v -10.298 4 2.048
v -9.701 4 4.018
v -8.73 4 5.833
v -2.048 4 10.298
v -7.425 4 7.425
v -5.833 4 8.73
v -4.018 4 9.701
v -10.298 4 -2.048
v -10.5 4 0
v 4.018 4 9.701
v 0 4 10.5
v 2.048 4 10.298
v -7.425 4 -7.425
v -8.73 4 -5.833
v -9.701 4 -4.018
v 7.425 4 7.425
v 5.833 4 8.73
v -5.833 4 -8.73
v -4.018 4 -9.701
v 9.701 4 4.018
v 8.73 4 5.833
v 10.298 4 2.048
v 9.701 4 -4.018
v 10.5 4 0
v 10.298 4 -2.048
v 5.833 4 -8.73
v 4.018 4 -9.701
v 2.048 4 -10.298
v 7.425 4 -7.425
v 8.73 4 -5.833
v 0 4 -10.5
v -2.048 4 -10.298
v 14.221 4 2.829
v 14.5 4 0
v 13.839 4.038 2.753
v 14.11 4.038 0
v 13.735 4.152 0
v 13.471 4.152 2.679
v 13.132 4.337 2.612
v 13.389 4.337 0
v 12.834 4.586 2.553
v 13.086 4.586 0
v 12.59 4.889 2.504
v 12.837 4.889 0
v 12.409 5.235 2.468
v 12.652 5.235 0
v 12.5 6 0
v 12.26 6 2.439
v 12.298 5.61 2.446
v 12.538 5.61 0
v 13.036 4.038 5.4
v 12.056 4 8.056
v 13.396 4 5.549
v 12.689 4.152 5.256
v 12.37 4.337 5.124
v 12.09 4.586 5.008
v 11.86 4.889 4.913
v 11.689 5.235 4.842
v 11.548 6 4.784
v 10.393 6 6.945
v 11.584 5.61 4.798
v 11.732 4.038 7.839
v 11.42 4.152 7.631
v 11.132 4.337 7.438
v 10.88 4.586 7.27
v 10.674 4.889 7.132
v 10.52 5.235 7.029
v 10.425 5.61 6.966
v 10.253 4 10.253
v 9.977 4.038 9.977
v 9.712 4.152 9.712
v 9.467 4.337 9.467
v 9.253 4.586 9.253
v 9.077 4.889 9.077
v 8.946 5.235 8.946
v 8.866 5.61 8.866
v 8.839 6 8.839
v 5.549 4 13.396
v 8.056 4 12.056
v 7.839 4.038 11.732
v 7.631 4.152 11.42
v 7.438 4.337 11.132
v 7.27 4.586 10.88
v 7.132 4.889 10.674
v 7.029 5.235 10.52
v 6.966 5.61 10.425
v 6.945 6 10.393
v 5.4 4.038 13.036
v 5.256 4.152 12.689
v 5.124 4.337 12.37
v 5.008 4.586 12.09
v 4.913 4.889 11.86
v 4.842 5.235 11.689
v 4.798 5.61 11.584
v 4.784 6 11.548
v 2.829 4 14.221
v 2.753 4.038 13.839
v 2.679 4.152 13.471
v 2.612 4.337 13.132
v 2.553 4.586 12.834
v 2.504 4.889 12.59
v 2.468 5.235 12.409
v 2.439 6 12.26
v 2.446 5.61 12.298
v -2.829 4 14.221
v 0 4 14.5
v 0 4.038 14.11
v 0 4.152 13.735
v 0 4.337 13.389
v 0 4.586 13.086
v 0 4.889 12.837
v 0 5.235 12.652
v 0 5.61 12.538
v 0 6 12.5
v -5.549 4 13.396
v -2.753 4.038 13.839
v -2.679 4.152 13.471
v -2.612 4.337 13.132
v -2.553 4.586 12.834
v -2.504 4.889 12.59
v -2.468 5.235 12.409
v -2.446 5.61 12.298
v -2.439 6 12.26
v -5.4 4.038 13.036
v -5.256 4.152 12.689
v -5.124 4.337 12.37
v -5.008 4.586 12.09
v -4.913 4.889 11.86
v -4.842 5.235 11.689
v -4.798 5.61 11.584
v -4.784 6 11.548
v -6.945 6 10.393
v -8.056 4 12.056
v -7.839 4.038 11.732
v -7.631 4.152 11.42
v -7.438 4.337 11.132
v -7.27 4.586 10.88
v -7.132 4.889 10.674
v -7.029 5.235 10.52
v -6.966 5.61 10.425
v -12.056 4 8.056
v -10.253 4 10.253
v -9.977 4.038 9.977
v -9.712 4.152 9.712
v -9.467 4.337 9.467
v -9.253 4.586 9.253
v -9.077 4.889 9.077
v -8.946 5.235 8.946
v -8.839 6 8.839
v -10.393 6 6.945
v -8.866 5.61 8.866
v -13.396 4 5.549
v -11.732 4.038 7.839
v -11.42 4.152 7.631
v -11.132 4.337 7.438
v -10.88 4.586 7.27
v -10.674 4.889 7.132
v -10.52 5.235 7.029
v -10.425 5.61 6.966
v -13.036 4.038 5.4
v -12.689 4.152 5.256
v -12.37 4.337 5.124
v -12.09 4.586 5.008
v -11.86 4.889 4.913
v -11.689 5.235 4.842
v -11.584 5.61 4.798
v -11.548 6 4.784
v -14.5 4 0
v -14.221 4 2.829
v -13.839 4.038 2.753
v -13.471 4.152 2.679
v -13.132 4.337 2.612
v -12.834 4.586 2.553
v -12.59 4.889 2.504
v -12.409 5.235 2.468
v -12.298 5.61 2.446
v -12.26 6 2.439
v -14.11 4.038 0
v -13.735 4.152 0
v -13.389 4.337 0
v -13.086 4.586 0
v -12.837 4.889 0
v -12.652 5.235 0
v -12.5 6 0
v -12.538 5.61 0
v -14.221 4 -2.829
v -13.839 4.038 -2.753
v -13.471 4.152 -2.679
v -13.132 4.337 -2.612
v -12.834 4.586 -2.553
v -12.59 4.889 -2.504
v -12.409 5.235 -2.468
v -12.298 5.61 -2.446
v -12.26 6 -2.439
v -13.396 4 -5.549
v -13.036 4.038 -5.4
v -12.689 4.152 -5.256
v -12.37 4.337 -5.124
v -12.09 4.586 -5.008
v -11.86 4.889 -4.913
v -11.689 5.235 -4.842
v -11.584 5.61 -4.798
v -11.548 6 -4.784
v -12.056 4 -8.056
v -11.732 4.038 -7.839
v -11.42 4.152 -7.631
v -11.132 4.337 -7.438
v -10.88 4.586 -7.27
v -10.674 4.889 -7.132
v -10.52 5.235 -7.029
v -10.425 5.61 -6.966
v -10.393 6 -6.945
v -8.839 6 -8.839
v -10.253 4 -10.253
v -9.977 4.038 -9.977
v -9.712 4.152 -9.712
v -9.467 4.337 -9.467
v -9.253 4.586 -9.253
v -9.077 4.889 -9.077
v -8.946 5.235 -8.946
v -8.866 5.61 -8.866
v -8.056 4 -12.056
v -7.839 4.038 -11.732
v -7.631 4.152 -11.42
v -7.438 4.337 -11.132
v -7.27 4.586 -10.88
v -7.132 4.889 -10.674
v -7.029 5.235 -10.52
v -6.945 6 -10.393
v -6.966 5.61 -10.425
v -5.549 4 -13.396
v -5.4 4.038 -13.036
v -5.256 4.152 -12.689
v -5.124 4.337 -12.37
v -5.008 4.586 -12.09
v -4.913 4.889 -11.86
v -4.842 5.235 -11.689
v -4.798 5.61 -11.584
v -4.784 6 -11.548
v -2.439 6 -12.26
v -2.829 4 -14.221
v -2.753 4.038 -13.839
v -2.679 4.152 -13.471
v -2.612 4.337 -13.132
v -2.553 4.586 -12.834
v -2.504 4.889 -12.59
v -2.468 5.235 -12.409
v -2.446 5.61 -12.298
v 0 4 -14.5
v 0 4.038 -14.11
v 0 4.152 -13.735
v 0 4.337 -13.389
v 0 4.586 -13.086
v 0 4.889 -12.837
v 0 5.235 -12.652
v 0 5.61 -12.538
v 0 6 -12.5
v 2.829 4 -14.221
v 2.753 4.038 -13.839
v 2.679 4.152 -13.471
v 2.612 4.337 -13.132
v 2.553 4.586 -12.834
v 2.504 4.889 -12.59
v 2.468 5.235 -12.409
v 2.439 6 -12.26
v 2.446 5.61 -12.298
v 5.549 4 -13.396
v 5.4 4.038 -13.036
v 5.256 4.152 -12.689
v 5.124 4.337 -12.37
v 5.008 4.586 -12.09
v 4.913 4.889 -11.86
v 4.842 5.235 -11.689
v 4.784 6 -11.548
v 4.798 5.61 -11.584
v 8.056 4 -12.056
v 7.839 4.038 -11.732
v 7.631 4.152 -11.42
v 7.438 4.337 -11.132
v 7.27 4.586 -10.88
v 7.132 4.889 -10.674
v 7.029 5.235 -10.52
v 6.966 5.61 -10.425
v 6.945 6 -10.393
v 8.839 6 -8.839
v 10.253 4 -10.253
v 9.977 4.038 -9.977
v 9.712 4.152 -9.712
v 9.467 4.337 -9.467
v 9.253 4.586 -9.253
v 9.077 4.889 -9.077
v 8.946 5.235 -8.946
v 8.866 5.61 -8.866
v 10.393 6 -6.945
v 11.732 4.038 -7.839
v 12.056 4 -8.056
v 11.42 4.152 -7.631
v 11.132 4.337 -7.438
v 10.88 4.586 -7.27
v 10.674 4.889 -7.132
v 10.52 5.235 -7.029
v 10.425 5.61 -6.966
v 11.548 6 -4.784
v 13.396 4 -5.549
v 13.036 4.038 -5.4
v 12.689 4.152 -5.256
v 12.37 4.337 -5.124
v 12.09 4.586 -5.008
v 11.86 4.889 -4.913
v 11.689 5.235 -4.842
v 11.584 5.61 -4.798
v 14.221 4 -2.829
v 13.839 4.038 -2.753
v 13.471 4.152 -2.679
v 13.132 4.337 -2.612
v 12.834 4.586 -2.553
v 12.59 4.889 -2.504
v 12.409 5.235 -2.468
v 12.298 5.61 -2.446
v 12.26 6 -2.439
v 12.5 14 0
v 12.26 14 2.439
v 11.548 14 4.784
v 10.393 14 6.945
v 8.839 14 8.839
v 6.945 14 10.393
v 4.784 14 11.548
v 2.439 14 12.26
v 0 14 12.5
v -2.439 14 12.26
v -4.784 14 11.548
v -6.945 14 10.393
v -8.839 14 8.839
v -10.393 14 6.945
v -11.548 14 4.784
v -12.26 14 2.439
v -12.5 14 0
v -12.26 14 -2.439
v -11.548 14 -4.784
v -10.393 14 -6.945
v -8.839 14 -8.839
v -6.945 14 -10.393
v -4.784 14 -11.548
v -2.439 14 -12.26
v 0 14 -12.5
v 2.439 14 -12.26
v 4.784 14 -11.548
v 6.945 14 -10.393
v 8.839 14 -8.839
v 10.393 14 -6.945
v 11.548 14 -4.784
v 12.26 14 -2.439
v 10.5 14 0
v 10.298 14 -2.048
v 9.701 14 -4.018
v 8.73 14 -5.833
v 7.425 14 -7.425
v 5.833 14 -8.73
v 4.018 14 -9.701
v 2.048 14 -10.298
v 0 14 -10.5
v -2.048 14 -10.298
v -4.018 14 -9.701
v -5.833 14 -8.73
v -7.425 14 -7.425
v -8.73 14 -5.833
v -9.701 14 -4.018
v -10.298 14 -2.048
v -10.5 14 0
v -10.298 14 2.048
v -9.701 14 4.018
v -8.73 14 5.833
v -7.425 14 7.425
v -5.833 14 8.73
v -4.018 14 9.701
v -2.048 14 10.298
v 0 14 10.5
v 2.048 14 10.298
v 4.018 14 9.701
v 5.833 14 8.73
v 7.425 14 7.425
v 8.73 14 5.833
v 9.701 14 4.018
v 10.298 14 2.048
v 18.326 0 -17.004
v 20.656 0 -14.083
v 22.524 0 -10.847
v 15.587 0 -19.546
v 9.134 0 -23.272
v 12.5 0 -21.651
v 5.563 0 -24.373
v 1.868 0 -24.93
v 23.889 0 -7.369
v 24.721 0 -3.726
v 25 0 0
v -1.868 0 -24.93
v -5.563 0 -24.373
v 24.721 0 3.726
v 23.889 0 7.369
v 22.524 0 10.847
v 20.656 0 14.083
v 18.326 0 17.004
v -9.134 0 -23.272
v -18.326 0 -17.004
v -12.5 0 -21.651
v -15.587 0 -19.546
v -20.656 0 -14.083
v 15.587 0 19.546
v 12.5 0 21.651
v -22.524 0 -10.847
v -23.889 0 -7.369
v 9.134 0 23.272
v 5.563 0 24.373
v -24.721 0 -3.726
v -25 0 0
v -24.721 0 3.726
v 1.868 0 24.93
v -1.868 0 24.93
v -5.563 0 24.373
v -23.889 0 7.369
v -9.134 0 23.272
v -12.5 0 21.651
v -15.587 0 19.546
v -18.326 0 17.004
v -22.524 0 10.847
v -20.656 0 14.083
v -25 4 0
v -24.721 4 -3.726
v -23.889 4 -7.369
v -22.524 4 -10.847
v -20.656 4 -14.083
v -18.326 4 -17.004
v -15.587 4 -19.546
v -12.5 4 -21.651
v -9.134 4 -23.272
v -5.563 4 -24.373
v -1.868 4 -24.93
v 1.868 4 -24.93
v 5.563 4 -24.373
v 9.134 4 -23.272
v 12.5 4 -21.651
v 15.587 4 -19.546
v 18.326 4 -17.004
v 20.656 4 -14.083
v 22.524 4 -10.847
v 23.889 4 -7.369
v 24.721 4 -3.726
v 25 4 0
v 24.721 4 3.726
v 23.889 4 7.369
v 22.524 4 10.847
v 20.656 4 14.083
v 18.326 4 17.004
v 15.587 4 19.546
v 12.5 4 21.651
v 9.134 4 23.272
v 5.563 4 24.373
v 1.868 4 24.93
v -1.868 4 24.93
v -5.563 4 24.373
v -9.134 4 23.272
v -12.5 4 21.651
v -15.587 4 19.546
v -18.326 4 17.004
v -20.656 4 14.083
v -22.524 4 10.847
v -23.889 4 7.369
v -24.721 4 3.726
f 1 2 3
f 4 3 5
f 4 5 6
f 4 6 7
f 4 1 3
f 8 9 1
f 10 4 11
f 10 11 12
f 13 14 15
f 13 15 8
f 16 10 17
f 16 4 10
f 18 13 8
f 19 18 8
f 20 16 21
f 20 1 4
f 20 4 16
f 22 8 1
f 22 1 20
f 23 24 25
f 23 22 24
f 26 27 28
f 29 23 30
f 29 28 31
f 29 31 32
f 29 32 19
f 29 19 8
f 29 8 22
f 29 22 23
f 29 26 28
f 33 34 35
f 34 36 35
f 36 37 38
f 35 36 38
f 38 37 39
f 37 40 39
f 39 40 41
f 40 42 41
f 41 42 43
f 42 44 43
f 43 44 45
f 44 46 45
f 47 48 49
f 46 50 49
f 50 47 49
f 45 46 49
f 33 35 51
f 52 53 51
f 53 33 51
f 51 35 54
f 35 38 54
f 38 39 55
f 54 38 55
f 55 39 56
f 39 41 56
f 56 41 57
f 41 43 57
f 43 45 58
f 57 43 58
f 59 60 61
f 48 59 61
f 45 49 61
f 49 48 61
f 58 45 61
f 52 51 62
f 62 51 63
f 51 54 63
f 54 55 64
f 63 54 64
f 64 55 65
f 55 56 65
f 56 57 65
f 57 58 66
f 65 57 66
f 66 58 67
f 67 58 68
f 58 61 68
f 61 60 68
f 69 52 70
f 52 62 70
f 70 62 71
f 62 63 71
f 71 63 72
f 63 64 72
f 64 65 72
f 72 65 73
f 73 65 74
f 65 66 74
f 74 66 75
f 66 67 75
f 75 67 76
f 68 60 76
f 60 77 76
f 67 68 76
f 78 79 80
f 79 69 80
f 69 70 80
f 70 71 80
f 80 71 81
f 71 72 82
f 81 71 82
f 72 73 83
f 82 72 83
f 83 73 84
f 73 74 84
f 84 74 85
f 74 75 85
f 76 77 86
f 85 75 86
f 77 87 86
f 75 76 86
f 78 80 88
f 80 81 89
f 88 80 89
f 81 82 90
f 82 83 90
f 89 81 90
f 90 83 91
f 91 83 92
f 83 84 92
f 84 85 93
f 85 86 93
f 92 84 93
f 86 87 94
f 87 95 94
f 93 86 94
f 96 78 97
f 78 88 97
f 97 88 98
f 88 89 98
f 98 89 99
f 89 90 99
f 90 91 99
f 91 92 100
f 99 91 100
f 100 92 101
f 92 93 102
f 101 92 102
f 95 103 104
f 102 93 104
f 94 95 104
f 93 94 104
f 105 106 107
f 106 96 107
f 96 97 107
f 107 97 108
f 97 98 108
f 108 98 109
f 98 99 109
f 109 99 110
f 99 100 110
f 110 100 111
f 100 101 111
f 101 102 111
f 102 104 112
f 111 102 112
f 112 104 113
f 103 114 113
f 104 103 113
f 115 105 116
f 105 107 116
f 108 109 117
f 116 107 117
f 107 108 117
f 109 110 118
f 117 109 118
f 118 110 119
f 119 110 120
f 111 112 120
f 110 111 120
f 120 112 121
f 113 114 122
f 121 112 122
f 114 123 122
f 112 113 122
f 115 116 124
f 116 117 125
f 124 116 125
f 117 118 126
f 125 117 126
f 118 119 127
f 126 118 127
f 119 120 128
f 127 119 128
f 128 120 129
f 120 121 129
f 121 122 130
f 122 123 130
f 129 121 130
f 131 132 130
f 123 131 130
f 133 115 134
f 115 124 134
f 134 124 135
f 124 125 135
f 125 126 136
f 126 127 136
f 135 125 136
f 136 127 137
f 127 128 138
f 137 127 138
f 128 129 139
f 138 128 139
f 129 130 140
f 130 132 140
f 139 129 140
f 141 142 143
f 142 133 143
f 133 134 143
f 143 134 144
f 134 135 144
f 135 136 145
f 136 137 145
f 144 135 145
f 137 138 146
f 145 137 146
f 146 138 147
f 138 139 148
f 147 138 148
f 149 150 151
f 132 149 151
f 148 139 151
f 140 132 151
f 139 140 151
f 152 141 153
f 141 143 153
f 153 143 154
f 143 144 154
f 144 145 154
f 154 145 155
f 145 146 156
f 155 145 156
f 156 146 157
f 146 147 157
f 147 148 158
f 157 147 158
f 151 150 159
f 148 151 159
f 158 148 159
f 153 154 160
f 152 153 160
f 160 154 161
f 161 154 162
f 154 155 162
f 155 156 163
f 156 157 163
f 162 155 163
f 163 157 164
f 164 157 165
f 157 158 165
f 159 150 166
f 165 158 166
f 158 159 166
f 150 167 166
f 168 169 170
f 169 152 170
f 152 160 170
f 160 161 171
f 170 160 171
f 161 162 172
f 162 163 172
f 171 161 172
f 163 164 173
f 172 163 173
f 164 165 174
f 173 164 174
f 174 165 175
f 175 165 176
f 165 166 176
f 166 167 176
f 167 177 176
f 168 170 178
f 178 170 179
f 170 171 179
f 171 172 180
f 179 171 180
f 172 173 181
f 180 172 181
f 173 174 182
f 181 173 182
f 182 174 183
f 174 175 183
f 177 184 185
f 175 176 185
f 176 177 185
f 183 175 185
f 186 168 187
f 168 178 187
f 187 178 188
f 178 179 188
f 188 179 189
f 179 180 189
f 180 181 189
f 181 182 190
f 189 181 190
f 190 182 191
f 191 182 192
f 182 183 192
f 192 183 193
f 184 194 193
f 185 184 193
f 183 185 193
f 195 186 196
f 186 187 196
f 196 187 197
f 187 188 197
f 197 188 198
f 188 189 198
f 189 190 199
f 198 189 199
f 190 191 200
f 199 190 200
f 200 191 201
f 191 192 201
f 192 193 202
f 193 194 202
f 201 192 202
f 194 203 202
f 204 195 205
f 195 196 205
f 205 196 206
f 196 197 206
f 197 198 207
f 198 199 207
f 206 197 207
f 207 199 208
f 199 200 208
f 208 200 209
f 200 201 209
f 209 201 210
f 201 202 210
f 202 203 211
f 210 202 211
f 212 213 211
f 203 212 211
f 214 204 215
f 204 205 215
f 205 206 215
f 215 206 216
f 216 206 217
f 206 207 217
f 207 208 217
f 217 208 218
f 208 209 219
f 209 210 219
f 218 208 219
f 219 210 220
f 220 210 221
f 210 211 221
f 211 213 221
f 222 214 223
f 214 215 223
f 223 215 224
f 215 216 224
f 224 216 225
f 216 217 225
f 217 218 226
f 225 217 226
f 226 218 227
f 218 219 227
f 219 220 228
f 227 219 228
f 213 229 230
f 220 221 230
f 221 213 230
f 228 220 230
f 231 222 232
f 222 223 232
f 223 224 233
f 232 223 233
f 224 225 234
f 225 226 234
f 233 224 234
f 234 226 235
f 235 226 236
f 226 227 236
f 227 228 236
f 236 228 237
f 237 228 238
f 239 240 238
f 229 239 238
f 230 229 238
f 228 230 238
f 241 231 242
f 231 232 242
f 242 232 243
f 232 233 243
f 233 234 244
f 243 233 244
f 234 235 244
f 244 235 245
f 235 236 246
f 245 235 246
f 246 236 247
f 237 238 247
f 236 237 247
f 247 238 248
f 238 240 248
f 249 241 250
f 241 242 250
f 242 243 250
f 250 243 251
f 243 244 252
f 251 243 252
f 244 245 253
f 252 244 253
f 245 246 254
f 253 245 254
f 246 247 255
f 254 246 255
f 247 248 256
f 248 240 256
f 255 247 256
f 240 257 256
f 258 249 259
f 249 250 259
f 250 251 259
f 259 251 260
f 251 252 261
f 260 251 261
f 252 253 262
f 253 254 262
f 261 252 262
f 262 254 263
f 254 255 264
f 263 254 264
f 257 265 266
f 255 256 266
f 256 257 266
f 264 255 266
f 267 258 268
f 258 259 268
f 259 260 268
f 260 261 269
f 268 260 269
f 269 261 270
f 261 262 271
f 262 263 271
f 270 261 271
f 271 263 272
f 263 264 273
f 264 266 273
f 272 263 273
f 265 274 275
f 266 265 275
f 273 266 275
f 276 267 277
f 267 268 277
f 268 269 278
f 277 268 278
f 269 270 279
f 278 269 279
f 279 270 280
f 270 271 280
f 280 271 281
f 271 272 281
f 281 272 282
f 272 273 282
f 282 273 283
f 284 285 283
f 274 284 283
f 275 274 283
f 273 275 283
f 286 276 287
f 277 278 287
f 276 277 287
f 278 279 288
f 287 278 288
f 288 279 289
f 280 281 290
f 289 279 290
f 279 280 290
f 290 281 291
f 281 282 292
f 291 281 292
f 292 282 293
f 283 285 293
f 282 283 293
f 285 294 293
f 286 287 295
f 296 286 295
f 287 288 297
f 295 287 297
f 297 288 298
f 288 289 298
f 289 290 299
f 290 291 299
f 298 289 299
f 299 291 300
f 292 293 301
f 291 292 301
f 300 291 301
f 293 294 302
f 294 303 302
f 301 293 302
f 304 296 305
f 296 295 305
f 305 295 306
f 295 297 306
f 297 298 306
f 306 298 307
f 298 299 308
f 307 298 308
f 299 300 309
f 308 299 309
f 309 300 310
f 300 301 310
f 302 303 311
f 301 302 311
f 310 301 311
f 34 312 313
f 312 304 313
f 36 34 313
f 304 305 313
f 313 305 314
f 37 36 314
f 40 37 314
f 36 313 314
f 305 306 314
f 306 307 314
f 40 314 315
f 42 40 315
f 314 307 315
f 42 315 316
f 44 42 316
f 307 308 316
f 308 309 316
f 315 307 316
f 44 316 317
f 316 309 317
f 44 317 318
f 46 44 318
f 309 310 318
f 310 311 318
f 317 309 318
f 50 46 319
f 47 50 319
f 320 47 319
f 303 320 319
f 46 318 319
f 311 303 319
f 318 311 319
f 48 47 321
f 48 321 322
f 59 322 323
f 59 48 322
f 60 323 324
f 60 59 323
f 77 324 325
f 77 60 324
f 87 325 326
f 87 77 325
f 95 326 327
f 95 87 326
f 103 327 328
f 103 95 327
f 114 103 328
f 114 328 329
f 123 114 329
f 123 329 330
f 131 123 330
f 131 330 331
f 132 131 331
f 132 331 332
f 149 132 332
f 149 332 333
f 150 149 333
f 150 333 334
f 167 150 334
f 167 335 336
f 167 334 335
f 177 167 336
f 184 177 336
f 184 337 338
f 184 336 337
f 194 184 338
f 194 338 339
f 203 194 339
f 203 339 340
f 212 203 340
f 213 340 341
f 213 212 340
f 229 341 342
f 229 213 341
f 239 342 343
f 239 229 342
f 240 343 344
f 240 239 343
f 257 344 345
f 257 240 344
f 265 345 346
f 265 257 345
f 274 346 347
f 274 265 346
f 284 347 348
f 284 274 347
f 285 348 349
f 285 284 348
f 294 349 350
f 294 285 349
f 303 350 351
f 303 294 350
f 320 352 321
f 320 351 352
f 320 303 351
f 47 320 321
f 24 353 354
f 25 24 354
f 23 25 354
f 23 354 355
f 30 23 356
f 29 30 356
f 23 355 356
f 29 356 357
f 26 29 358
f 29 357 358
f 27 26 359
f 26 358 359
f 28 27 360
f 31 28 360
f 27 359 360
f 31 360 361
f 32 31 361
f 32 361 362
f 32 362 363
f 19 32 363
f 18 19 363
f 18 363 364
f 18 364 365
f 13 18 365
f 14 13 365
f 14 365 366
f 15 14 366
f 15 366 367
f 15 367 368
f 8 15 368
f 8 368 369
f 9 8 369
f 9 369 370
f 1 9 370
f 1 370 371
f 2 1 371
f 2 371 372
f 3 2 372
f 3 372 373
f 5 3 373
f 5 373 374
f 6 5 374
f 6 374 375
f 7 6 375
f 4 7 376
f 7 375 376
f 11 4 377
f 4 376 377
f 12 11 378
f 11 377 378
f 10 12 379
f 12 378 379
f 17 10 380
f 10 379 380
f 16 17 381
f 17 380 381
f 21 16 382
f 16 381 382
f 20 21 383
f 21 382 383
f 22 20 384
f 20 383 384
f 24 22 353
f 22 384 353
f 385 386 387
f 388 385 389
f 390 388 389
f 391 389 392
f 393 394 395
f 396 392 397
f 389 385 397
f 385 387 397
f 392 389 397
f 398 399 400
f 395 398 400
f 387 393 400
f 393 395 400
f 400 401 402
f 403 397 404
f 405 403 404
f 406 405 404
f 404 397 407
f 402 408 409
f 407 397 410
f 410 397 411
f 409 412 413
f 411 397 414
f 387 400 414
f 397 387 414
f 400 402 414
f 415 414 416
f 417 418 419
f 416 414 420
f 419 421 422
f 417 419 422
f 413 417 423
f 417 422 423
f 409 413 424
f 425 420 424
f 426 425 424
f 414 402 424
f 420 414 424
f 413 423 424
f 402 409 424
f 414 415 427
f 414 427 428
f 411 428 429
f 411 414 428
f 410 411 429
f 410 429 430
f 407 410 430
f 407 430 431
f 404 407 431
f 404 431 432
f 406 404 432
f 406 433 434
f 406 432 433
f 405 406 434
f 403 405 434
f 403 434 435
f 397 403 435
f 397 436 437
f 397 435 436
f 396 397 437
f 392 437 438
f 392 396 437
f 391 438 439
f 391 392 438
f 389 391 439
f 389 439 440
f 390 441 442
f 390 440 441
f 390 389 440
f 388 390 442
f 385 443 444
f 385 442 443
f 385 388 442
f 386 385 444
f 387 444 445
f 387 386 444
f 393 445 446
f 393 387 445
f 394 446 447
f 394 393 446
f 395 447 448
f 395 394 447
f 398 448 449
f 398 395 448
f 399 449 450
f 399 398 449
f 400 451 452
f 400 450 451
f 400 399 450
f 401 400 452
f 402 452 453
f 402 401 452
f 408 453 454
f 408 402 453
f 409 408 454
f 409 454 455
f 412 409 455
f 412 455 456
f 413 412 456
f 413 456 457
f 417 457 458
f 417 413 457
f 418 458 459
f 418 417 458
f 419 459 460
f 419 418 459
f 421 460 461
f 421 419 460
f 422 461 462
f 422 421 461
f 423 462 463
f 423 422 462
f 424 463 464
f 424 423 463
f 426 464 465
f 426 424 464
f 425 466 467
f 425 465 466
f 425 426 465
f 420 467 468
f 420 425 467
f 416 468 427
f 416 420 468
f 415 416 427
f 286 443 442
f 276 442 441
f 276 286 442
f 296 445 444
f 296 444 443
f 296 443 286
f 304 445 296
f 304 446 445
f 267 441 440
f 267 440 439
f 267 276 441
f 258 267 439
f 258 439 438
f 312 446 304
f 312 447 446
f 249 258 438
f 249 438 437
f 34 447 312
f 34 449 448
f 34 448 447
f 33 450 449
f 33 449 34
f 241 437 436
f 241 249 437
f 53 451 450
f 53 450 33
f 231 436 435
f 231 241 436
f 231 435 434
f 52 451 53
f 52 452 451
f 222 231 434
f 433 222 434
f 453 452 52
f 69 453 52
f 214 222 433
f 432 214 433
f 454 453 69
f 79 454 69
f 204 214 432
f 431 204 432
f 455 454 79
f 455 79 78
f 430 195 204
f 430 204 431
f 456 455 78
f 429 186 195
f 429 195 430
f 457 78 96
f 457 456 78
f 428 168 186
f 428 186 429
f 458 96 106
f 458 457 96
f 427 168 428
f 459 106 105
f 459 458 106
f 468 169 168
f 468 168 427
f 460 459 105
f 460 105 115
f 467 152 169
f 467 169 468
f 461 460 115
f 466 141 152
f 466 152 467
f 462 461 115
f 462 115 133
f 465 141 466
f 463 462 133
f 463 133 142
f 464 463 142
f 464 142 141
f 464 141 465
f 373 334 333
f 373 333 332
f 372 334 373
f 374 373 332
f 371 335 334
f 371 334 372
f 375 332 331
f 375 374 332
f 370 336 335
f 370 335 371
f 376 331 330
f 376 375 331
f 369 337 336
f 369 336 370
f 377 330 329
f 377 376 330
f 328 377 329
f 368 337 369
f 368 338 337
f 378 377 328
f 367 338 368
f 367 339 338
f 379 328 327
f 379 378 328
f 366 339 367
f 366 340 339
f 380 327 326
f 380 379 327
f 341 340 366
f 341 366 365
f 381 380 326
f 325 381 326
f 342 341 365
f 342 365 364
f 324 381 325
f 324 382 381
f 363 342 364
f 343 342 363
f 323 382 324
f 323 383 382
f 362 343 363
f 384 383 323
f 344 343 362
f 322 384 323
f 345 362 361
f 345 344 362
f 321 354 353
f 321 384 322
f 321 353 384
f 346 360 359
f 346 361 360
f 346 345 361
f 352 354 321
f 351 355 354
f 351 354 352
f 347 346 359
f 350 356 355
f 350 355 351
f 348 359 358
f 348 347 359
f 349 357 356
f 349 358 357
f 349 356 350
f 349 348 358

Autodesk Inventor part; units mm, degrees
ref_plane "YZ Plane" through (0, 0, 0) normal (1, 0, 0) x (0, 1, 0)
ref_plane "XZ Plane" through (0, 0, 0) normal (0, 1, 0) x (-1, 0, 0)
ref_plane "XY Plane" through (0, 0, 0) normal (0, 0, 1) x (1, 0, 0)
sketch "Sketch1" plane through (0, 0, 0) normal (0, 1, 0) x (-1, 0, 0)
  circle A0 centre (0, 0) radius 25
  dimension "d0" = 50
extrude "Extrusion1" add sketch "Sketch1" along normal blind 4
sketch "Sketch2" plane through (0, 4, 0) normal (0, 1, 0) x (1, 0, 0)
  circle A0 centre (0, 0) radius 12.5
  dimension "d3" = 25
extrude "Extrusion2" add sketch "Sketch2" along normal blind 10
sketch "Sketch3" plane through (0, 14, 0) normal (0, 1, 0) x (1, 0, 0)
  circle A0 centre (0, 0) radius 10.5
  dimension "d6" = 21
extrude "Extrusion3" cut sketch "Sketch3" against normal blind 10
fillet "Fillet1" radius 2 1 edges at (-12.5, 4, 0)
properties part number "Brida"
